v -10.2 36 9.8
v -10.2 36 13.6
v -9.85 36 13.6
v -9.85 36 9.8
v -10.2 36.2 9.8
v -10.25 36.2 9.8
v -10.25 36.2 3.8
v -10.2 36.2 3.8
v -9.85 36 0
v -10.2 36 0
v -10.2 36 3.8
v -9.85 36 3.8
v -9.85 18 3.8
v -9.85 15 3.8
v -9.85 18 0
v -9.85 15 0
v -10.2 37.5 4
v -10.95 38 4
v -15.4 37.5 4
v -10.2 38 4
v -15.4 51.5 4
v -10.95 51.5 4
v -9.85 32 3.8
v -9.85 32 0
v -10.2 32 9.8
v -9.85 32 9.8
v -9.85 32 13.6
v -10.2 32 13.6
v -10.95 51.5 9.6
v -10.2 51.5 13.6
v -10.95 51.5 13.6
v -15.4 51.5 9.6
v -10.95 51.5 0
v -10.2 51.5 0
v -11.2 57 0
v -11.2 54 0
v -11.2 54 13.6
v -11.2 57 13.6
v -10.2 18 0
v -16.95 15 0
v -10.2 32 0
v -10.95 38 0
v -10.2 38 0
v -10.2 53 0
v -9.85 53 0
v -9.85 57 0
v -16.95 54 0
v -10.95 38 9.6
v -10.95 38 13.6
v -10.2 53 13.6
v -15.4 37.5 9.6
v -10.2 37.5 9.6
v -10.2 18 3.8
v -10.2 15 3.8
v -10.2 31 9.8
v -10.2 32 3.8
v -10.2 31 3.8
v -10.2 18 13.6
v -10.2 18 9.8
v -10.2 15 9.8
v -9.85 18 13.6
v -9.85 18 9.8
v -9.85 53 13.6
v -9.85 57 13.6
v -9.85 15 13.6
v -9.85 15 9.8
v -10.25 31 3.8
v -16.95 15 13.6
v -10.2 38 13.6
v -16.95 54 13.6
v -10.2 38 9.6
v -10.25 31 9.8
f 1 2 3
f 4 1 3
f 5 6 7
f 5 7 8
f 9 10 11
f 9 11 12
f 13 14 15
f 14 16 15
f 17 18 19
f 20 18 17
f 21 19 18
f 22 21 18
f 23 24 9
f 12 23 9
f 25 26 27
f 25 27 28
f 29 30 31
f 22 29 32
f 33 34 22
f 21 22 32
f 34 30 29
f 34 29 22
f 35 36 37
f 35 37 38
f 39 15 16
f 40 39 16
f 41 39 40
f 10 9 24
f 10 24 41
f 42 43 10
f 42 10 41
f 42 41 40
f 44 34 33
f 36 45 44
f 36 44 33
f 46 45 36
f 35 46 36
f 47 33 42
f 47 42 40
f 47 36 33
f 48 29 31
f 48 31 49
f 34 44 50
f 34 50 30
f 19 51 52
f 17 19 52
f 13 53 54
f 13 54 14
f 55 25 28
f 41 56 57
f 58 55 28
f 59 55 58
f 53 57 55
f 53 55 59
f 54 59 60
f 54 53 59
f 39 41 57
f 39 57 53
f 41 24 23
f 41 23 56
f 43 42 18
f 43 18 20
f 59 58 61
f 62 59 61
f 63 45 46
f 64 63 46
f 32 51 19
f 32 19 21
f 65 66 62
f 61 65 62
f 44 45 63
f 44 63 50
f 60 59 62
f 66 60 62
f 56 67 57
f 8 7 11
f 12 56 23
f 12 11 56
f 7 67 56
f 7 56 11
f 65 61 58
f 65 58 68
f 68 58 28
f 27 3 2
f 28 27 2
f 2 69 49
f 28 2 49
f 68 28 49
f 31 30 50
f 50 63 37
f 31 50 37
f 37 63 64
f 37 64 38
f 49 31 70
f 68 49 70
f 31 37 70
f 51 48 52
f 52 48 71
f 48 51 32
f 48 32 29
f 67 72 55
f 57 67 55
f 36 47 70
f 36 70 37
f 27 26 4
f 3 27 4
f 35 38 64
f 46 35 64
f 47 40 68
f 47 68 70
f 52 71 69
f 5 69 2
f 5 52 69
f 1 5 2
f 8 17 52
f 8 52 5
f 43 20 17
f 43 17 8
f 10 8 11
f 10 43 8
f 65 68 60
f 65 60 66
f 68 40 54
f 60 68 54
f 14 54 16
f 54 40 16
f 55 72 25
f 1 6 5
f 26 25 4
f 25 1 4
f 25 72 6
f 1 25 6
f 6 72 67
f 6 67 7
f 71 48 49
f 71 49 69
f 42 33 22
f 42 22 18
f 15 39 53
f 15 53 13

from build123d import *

# Parameters (mm, degrees)
GUIDE_AND_SOLID_STOPS_DEPTH   = 13.6
SKETCH_3_W                    = 8.4
SKETCH_3_H                    = 14
NUT_TONGUE_CHANNEL_DEPTH      = 2.8
SKETCH_4_W                    = 6.25
SKETCH_4_H                    = 5.2
LOWER_YOKE_RELIEF_DEPTH       = 3
SKETCH_5_W                    = 3.7
SKETCH_5_H                    = 3
LOWER_INWARD_STOP_DEPTH       = 3.8
SKETCH_7_W                    = 3.7
SKETCH_7_H                    = 3
EXTRUDE_2_DEPTH               = 3.8
REMOVE_LOWER_TAIL_DEPTH       = 62.002151601
REMOVE_LOWER_TAIL_DEPTH_BACK  = 62.002151601
SKETCH_8_W                    = 17
SKETCH_8_H                    = 17
WIDER_SHAFT_RELIEF_DEPTH      = 62.002151601
WIDER_SHAFT_RELIEF_DEPTH_BACK = 62.002151601
SKETCH_9_W                    = 9.85
SKETCH_9_H                    = 46


with BuildPart() as part:
    # 草图1 → Guide_and_solid_stops (new body)
    with BuildSketch(Plane.XY):
        Polygon((-10.2, 0), (-16.95, 0), (-16.95, 54), (-11.2, 54), (-11.2, 57), (-4.7, 57), (-4.7, 53), (-10.2, 53), (-10.2, 51.5), (-10.95, 51.5), (-10.95, 38), (-10.2, 38), (-10.2, 36), (-4.7, 36), (-4.7, 32), (-10.2, 32), align=None)
    extrude(amount=GUIDE_AND_SOLID_STOPS_DEPTH)

    # 草图3 → Nut_tongue_channel (cut, symmetric)
    with BuildSketch(Plane.XY.offset(6.8)):
        with Locations((-11.2, 44.5)):
            Rectangle(SKETCH_3_W, SKETCH_3_H)
    extrude(amount=NUT_TONGUE_CHANNEL_DEPTH, both=True, mode=Mode.SUBTRACT)

    # 草图4 → Lower_yoke_relief (cut, symmetric)
    with BuildSketch(Plane.XY.offset(6.8)):
        with Locations((-7.125, 33.6)):
            Rectangle(SKETCH_4_W, SKETCH_4_H)
    extrude(amount=LOWER_YOKE_RELIEF_DEPTH, both=True, mode=Mode.SUBTRACT)

    # 草图5 → Lower_inward_stop (add)
    with BuildSketch(Plane.XY):
        with Locations((-9.35, 16.5)):
            Rectangle(SKETCH_5_W, SKETCH_5_H)
    extrude(amount=LOWER_INWARD_STOP_DEPTH)

    # 草图7 → 凸台-拉伸2 (add)
    with BuildSketch(Plane.XY.offset(9.8)):
        with Locations((-9.35, 16.5)):
            Rectangle(SKETCH_7_W, SKETCH_7_H)
    extrude(amount=EXTRUDE_2_DEPTH)

    # 草图8 → Remove_lower_tail (cut, two sides: drawn at the far end of the back side and taken through both)
    with BuildSketch(Plane.XY.offset(-REMOVE_LOWER_TAIL_DEPTH_BACK)):
        with Locations((-11.5, 6.5)):
            Rectangle(SKETCH_8_W, SKETCH_8_H)
    extrude(amount=REMOVE_LOWER_TAIL_DEPTH + REMOVE_LOWER_TAIL_DEPTH_BACK, mode=Mode.SUBTRACT)

    # 草图9 → Wider_shaft_relief (cut, two sides: drawn at the far end of the back side and taken through both)
    with BuildSketch(Plane.XY.offset(-WIDER_SHAFT_RELIEF_DEPTH_BACK)):
        with Locations((-4.925, 36)):
            Rectangle(SKETCH_9_W, SKETCH_9_H)
    extrude(amount=WIDER_SHAFT_RELIEF_DEPTH + WIDER_SHAFT_RELIEF_DEPTH_BACK, mode=Mode.SUBTRACT)


solid = part.part
